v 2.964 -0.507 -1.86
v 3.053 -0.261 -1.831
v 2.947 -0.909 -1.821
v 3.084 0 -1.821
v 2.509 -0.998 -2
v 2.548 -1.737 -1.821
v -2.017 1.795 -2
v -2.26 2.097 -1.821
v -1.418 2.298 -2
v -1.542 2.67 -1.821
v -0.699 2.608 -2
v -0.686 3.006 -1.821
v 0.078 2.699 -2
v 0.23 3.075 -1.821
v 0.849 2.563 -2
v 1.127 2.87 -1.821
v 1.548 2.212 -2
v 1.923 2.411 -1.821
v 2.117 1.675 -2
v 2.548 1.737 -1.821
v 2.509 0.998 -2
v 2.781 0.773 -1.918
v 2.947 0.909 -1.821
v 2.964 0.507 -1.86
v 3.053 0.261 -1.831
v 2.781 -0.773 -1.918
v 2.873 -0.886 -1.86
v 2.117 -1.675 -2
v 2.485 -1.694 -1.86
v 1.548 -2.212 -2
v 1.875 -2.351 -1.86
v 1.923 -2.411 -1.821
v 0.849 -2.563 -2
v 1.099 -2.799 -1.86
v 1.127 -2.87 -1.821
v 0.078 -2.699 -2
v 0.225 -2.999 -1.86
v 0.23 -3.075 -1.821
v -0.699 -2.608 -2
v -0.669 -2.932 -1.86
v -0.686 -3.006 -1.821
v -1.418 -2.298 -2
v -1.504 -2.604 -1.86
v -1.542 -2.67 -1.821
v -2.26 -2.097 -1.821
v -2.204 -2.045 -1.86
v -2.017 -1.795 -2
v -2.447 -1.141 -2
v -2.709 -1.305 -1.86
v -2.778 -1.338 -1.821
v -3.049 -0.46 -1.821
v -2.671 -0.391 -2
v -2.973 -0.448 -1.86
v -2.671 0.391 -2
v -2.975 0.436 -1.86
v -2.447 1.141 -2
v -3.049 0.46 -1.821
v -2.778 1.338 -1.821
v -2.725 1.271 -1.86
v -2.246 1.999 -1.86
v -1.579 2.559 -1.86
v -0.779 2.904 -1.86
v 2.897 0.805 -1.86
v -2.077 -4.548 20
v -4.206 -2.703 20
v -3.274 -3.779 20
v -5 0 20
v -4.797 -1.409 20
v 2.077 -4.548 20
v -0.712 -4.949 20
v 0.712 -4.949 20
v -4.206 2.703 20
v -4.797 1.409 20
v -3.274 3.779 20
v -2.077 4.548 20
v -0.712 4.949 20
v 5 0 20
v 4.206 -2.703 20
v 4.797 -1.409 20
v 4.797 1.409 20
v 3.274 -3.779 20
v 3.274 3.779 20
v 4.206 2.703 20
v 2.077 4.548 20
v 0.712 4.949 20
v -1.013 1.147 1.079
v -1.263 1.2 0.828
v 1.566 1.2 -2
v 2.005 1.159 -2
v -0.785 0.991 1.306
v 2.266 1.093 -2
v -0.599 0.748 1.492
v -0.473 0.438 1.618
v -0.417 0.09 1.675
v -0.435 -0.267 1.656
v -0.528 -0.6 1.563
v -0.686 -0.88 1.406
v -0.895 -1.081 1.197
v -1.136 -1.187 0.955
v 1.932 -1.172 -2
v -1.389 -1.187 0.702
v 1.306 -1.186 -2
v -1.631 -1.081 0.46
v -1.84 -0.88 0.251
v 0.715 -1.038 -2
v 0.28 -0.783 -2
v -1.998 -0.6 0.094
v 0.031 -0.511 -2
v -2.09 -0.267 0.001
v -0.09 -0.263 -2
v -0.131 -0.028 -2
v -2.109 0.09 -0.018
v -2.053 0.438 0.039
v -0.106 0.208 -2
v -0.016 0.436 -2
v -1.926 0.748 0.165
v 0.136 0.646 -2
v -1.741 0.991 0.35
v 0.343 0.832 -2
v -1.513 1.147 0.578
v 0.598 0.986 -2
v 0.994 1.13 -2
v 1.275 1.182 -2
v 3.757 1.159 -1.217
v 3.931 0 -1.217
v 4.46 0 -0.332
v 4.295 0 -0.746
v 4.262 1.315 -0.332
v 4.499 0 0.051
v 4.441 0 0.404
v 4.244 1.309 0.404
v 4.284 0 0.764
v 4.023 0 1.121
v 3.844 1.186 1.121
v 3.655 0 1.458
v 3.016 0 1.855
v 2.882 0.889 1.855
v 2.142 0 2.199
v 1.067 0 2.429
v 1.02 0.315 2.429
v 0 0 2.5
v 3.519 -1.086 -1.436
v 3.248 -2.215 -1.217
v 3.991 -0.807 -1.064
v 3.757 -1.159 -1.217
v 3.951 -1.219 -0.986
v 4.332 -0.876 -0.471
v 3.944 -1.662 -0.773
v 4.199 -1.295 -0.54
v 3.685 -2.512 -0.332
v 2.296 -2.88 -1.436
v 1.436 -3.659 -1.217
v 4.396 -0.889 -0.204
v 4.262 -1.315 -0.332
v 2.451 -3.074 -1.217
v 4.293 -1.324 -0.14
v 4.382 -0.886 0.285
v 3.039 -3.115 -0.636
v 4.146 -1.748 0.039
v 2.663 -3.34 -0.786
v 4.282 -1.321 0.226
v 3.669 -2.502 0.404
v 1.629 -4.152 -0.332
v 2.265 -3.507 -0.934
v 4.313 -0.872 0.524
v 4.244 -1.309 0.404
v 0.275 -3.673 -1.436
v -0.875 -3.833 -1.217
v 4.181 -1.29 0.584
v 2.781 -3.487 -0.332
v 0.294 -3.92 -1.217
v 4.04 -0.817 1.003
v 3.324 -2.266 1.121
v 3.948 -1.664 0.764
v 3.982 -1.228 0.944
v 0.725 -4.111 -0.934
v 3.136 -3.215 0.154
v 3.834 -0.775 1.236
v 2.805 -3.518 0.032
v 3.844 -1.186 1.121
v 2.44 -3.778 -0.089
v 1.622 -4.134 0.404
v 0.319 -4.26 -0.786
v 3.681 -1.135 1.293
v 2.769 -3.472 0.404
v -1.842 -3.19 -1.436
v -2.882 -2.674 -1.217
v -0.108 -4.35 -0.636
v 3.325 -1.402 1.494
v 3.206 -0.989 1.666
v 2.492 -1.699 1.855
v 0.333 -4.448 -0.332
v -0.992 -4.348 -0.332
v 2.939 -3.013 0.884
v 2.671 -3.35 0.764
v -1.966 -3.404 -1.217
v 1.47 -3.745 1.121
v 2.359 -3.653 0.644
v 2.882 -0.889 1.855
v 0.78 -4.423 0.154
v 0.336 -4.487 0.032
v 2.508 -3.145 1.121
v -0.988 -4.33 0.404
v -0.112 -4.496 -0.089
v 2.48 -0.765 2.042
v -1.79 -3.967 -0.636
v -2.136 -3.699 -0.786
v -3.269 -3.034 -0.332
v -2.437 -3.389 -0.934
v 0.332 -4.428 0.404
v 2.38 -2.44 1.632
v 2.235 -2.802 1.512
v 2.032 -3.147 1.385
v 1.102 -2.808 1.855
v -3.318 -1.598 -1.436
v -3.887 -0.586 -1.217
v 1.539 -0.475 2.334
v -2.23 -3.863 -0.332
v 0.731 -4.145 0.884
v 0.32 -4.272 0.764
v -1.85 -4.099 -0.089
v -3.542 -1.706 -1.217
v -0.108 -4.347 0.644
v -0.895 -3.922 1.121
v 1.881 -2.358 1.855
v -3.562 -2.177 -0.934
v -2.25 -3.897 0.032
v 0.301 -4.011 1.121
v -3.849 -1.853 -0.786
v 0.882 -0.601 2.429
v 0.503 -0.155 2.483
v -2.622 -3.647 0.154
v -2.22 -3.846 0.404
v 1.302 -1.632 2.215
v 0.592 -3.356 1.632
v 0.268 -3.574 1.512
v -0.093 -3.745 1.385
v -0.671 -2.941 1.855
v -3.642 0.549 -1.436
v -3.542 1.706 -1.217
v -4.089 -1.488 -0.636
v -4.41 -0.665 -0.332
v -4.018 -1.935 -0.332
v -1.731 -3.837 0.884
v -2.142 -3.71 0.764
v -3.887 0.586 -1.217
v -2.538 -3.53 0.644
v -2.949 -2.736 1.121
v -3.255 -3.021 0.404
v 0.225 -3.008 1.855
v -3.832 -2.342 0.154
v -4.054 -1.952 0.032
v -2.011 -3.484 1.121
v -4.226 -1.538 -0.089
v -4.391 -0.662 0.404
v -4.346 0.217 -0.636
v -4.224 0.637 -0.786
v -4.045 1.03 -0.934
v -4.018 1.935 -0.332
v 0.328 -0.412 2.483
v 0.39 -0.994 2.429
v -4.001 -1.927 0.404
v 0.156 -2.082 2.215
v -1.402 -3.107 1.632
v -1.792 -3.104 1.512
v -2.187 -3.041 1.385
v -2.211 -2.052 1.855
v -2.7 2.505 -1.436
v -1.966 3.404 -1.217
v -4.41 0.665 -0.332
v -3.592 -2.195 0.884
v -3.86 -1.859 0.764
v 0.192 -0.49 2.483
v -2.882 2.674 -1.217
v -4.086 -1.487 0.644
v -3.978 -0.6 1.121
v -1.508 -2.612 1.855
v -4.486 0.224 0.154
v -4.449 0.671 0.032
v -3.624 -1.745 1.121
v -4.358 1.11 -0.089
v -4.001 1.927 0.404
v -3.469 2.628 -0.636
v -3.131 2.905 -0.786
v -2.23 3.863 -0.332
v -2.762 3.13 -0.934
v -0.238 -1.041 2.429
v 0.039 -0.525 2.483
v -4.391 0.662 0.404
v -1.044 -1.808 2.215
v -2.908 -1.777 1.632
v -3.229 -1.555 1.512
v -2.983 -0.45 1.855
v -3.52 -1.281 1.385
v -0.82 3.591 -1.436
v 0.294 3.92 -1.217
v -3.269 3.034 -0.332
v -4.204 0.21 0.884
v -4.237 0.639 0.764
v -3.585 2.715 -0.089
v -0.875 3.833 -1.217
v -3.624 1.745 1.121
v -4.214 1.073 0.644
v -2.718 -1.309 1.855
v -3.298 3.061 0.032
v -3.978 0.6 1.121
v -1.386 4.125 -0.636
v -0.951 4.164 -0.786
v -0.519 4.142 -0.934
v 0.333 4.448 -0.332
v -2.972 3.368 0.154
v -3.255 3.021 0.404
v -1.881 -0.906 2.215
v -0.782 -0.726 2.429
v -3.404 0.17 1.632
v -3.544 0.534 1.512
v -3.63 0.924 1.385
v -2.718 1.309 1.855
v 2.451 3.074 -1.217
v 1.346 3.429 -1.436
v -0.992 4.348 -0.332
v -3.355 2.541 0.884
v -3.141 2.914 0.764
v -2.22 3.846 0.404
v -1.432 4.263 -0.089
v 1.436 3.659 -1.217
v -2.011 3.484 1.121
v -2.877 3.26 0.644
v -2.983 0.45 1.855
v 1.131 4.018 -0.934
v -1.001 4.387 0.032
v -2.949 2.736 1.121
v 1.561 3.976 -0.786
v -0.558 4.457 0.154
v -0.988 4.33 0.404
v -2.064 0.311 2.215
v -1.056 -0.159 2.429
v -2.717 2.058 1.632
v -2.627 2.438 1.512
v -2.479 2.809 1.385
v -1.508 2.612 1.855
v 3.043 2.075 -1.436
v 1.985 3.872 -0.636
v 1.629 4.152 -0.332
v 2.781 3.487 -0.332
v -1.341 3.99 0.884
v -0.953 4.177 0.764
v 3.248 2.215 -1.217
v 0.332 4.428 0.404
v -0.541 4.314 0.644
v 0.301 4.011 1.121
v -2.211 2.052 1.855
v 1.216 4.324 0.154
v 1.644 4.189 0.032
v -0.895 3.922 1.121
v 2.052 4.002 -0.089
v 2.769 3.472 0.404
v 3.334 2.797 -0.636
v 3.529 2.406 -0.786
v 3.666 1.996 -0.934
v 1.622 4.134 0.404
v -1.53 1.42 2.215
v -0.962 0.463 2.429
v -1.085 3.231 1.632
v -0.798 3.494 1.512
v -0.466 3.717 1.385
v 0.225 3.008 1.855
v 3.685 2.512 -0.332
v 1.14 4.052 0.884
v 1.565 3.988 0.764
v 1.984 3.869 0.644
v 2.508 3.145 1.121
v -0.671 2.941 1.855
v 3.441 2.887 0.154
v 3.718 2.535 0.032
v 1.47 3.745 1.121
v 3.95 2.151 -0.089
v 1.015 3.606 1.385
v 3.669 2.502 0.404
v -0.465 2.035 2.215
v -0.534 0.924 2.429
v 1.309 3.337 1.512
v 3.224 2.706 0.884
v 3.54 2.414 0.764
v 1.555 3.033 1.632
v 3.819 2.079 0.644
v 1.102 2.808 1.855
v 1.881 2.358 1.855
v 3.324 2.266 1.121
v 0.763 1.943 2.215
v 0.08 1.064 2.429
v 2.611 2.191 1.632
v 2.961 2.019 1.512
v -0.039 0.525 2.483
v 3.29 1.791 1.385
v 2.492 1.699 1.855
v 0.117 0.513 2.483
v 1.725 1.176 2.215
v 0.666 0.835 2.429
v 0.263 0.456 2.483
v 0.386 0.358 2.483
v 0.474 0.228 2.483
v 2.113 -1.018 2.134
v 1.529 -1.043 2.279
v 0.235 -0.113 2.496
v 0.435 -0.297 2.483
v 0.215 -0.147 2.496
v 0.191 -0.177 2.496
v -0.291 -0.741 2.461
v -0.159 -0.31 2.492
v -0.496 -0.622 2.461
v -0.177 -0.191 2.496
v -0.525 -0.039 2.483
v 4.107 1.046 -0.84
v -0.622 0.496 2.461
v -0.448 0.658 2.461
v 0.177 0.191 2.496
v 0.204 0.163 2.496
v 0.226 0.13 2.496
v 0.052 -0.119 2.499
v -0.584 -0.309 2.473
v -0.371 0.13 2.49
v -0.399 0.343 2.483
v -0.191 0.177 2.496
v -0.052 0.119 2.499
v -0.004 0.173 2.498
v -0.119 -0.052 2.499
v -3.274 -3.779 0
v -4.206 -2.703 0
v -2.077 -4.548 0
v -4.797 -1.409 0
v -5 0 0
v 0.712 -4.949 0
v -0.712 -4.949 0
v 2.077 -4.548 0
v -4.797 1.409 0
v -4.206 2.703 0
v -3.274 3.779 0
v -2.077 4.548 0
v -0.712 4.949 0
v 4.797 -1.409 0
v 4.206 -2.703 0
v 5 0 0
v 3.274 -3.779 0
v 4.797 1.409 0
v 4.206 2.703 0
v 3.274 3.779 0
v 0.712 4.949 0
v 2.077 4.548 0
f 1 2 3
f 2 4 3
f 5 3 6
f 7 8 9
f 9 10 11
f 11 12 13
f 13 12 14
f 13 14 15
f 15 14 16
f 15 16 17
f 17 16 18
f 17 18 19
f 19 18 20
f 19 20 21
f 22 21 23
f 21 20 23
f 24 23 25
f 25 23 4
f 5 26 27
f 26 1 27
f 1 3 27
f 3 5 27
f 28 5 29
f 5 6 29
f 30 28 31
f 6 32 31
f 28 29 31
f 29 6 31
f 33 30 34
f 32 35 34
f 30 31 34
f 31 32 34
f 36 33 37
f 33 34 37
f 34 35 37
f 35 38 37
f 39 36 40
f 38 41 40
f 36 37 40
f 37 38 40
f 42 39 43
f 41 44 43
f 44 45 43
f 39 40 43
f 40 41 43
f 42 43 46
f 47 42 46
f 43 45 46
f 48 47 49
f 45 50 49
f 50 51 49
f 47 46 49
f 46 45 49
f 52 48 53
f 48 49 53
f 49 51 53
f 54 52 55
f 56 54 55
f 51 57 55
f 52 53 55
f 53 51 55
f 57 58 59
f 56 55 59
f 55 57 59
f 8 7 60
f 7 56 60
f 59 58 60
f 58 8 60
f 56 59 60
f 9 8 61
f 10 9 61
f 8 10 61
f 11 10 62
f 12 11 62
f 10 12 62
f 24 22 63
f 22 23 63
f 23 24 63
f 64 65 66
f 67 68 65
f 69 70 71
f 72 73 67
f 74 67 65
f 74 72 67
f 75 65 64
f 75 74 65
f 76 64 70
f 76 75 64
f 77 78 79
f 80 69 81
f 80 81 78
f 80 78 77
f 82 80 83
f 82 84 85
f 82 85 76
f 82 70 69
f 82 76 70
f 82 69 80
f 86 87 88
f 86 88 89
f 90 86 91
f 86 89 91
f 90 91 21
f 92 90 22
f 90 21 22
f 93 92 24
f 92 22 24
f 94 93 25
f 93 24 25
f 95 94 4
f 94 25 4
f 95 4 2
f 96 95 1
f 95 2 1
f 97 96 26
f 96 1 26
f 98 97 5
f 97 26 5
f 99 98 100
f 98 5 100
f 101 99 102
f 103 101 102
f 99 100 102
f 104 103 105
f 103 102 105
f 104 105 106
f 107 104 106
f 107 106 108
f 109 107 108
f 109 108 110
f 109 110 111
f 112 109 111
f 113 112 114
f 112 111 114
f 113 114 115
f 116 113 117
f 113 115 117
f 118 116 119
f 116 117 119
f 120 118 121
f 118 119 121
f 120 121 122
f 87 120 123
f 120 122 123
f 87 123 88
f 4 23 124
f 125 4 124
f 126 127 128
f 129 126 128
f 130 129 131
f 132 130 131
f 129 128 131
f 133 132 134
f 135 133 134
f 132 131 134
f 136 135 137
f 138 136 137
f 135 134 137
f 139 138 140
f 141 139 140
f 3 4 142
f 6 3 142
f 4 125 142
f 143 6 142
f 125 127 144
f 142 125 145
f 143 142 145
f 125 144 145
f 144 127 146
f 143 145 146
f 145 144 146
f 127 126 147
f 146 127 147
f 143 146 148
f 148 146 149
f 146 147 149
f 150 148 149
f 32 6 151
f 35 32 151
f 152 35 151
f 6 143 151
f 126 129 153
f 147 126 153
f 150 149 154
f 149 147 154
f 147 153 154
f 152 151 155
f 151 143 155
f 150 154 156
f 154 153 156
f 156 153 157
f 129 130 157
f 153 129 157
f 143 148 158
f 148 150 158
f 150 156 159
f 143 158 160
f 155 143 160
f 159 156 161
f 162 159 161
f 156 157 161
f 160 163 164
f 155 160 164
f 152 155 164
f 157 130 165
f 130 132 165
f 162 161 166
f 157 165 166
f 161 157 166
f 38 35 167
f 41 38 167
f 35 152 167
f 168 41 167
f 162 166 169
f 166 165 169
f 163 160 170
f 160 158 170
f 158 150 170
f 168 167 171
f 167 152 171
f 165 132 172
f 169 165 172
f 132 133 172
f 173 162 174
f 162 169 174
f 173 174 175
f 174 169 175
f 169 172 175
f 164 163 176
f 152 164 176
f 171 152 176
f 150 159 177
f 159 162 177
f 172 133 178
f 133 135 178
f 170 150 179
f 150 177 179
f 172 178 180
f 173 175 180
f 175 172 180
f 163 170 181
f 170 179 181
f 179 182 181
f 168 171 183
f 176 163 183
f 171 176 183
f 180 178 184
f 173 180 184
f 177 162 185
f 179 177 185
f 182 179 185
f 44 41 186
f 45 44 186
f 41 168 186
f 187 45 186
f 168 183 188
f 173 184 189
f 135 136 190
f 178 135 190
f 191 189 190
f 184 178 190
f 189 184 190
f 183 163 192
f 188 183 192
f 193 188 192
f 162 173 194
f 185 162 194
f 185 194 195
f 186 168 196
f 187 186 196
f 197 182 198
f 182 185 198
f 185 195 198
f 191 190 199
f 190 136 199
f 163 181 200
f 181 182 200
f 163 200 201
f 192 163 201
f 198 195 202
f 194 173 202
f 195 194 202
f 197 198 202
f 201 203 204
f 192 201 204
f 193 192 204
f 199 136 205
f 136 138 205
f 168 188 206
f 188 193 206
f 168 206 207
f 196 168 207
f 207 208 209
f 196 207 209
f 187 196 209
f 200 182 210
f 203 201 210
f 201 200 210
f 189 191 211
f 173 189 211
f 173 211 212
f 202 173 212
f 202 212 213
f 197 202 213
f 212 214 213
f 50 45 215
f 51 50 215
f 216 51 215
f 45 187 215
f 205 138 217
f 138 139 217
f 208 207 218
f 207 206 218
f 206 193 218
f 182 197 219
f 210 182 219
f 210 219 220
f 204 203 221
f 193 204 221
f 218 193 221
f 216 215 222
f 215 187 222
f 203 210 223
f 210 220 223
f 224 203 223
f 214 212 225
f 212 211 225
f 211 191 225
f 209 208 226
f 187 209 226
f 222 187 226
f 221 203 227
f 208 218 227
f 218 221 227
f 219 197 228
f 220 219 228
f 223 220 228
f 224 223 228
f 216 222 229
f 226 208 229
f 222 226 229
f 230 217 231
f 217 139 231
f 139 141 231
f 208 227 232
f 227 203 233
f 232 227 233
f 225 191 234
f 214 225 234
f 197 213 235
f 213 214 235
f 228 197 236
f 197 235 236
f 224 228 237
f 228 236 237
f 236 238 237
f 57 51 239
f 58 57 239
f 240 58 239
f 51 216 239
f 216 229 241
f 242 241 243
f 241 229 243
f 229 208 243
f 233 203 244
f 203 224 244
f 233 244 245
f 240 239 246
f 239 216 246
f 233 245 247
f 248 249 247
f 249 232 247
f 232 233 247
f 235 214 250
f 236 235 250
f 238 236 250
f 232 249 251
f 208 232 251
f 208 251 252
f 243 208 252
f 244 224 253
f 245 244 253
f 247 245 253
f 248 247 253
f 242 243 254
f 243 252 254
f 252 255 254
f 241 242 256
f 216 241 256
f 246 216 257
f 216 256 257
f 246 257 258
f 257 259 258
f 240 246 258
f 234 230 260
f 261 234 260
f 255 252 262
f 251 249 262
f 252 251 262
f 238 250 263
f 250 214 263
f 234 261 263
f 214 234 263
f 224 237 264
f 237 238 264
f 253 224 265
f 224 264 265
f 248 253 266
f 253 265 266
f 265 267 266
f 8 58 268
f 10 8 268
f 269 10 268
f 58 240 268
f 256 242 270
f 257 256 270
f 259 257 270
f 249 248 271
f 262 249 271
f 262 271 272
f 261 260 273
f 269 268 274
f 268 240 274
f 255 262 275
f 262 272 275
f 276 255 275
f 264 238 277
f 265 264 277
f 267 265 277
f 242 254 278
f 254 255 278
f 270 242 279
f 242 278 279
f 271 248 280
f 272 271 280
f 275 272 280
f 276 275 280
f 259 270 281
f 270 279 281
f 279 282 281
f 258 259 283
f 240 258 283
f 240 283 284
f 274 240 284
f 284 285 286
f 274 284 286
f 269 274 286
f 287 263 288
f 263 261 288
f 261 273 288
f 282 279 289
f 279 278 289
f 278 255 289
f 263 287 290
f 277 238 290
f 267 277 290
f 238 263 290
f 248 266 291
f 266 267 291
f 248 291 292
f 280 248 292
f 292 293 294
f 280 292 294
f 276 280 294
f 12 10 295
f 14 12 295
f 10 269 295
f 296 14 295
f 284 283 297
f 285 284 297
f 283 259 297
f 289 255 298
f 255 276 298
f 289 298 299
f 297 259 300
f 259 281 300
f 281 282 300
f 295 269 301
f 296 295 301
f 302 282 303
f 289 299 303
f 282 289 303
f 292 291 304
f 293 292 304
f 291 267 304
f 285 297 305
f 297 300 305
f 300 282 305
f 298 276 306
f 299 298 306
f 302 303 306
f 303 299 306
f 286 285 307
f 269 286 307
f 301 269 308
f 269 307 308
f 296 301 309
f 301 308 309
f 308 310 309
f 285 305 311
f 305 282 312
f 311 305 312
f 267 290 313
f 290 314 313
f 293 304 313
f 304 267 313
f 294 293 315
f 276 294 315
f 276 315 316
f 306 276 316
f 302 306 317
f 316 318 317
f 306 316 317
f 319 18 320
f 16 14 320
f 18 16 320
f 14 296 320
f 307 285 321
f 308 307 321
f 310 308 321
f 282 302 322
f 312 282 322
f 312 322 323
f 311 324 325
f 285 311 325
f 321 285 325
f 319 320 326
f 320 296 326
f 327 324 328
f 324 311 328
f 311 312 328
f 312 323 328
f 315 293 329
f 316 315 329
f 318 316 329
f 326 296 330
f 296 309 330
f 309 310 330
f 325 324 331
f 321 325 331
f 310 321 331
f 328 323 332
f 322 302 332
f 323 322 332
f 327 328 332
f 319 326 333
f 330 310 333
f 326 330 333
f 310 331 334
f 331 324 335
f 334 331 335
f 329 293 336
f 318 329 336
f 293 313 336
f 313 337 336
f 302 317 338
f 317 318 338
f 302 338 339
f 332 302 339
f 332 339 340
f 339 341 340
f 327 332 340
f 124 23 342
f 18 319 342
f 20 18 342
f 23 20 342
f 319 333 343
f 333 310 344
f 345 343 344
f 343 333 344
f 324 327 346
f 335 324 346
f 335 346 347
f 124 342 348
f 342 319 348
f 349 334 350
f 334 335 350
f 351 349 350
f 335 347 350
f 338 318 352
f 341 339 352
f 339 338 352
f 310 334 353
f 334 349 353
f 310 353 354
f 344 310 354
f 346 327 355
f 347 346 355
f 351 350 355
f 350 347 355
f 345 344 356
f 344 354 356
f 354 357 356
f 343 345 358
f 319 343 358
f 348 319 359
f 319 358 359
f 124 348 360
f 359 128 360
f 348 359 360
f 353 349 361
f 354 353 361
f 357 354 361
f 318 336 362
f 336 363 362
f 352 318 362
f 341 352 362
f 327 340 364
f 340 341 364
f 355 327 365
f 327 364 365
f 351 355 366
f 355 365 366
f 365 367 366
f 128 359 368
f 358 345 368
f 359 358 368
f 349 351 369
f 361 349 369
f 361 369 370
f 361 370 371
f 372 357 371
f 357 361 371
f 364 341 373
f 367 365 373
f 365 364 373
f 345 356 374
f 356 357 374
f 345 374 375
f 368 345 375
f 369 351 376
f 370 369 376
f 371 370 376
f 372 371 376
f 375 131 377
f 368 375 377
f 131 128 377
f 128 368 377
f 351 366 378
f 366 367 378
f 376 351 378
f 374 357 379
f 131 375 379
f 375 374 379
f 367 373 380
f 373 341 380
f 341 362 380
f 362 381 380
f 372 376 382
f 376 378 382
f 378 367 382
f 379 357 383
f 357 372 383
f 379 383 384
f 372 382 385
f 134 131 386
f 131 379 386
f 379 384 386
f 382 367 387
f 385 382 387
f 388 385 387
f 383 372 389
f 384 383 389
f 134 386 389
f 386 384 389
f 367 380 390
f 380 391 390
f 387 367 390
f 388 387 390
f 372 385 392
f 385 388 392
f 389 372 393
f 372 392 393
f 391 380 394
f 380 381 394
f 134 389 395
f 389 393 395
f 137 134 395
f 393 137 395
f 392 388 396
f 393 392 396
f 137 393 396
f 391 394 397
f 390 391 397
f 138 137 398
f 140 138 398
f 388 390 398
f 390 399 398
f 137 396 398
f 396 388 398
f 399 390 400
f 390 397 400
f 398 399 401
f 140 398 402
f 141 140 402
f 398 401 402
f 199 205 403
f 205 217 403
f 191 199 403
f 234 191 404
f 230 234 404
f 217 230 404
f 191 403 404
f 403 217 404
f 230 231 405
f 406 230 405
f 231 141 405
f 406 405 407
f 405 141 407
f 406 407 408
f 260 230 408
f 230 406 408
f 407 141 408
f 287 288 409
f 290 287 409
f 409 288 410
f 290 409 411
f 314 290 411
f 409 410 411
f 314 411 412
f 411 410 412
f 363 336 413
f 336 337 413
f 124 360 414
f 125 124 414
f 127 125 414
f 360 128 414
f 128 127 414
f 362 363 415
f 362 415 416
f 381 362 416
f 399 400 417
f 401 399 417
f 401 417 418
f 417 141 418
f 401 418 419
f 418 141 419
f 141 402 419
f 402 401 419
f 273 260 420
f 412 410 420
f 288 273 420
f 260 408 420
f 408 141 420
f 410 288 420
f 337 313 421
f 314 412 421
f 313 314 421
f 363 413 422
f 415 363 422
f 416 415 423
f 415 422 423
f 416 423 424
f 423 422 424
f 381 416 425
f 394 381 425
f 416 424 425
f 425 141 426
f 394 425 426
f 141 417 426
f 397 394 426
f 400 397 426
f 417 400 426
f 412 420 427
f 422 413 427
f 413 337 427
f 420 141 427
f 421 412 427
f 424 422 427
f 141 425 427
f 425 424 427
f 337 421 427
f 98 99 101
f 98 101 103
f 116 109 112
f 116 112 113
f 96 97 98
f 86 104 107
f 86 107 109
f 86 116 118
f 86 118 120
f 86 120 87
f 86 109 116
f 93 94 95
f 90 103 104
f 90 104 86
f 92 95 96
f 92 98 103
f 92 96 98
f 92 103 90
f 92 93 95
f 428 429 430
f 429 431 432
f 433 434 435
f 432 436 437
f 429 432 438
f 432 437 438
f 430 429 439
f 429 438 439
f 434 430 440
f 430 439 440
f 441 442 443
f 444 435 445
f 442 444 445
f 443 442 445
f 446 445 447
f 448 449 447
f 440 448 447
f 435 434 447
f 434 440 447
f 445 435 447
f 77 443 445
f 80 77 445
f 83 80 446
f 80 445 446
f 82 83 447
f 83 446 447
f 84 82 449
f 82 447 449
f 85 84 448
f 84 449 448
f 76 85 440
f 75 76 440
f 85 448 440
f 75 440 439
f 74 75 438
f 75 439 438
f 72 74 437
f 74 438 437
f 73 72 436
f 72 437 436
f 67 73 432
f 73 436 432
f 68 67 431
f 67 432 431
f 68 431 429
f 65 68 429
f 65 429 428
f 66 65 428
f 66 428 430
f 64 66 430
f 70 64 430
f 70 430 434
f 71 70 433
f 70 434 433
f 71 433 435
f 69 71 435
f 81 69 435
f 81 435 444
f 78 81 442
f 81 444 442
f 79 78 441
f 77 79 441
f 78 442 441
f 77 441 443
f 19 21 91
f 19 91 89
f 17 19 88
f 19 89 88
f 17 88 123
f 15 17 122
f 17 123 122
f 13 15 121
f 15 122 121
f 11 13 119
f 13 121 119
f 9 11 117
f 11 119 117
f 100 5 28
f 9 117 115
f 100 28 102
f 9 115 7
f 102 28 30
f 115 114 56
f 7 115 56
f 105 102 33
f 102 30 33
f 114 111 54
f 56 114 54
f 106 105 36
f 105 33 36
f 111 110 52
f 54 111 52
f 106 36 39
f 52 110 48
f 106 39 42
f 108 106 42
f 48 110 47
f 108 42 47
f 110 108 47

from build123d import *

# Parameters (mm, degrees)
F3_R     = 1.2
F4_DEPTH = 6.0436568389
F5_R     = 5
F6_DEPTH = 20


with BuildPart() as f1:
    # F0 (on Front) → F1 (revolve)
    with BuildSketch(Plane.XZ):
        with BuildLine():
            add(Edge.make_bspline(
                [(2.7, -2), (2.9007970127, -1.916334578), (3.0836008504, -1.8207824423)],
                knots=[5.3558900892, 5.3558900892, 5.3558900892, 5.4673285167, 5.4673285167, 5.4673285167], degree=2, weights=[1, 0.9984480862, 1]))
            Line((3.0836008504, -1.8207824423), (0, 1.262818408))
            Line((0, 1.262818408), (0, -2))
            Line((0, -2), (2.7, -2))
        make_face()
        with BuildLine():
            add(Edge.make_bspline(
                [(3.0836008504, -1.8207824423), (4.5, -1.0804261923), (4.5, 0)],
                knots=[5.4673285167, 5.4673285167, 5.4673285167, 6.2831853072, 6.2831853072, 6.2831853072], degree=2, weights=[1, 0.9179446153, 1]))
            add(Edge.make_bspline(
                [(4.5, 0), (4.5, 2.5), (0, 2.5)],
                knots=[0, 0, 0, 1.5707963268, 1.5707963268, 1.5707963268], degree=2, weights=[1, 0.7071067812, 1]))
            Line((0, 2.5), (0, 1.262818408))
            Line((0, 1.262818408), (3.0836008504, -1.8207824423))
        make_face()
    revolve(axis=Axis((0, 0, 0.25), (0, 0, -1)))

    # F3 (on line) → F4 (cut, through all)
    with BuildSketch(Plane(origin=(3.2279646758, 0, -3.2279646758), x_dir=(0, 1, 0), z_dir=(0.7071067812, 0, -0.7071067812))):
        with Locations((0, -0.3070525403)):
            Circle(F3_R)
    extrude(amount=-F4_DEPTH, mode=Mode.SUBTRACT)


with BuildPart() as f6:
    # F5 (on Top) → F6 (new body)
    with BuildSketch(Plane.XY):
        Circle(F5_R)
    extrude(amount=F6_DEPTH)


solid = Compound([f1.part, f6.part])
